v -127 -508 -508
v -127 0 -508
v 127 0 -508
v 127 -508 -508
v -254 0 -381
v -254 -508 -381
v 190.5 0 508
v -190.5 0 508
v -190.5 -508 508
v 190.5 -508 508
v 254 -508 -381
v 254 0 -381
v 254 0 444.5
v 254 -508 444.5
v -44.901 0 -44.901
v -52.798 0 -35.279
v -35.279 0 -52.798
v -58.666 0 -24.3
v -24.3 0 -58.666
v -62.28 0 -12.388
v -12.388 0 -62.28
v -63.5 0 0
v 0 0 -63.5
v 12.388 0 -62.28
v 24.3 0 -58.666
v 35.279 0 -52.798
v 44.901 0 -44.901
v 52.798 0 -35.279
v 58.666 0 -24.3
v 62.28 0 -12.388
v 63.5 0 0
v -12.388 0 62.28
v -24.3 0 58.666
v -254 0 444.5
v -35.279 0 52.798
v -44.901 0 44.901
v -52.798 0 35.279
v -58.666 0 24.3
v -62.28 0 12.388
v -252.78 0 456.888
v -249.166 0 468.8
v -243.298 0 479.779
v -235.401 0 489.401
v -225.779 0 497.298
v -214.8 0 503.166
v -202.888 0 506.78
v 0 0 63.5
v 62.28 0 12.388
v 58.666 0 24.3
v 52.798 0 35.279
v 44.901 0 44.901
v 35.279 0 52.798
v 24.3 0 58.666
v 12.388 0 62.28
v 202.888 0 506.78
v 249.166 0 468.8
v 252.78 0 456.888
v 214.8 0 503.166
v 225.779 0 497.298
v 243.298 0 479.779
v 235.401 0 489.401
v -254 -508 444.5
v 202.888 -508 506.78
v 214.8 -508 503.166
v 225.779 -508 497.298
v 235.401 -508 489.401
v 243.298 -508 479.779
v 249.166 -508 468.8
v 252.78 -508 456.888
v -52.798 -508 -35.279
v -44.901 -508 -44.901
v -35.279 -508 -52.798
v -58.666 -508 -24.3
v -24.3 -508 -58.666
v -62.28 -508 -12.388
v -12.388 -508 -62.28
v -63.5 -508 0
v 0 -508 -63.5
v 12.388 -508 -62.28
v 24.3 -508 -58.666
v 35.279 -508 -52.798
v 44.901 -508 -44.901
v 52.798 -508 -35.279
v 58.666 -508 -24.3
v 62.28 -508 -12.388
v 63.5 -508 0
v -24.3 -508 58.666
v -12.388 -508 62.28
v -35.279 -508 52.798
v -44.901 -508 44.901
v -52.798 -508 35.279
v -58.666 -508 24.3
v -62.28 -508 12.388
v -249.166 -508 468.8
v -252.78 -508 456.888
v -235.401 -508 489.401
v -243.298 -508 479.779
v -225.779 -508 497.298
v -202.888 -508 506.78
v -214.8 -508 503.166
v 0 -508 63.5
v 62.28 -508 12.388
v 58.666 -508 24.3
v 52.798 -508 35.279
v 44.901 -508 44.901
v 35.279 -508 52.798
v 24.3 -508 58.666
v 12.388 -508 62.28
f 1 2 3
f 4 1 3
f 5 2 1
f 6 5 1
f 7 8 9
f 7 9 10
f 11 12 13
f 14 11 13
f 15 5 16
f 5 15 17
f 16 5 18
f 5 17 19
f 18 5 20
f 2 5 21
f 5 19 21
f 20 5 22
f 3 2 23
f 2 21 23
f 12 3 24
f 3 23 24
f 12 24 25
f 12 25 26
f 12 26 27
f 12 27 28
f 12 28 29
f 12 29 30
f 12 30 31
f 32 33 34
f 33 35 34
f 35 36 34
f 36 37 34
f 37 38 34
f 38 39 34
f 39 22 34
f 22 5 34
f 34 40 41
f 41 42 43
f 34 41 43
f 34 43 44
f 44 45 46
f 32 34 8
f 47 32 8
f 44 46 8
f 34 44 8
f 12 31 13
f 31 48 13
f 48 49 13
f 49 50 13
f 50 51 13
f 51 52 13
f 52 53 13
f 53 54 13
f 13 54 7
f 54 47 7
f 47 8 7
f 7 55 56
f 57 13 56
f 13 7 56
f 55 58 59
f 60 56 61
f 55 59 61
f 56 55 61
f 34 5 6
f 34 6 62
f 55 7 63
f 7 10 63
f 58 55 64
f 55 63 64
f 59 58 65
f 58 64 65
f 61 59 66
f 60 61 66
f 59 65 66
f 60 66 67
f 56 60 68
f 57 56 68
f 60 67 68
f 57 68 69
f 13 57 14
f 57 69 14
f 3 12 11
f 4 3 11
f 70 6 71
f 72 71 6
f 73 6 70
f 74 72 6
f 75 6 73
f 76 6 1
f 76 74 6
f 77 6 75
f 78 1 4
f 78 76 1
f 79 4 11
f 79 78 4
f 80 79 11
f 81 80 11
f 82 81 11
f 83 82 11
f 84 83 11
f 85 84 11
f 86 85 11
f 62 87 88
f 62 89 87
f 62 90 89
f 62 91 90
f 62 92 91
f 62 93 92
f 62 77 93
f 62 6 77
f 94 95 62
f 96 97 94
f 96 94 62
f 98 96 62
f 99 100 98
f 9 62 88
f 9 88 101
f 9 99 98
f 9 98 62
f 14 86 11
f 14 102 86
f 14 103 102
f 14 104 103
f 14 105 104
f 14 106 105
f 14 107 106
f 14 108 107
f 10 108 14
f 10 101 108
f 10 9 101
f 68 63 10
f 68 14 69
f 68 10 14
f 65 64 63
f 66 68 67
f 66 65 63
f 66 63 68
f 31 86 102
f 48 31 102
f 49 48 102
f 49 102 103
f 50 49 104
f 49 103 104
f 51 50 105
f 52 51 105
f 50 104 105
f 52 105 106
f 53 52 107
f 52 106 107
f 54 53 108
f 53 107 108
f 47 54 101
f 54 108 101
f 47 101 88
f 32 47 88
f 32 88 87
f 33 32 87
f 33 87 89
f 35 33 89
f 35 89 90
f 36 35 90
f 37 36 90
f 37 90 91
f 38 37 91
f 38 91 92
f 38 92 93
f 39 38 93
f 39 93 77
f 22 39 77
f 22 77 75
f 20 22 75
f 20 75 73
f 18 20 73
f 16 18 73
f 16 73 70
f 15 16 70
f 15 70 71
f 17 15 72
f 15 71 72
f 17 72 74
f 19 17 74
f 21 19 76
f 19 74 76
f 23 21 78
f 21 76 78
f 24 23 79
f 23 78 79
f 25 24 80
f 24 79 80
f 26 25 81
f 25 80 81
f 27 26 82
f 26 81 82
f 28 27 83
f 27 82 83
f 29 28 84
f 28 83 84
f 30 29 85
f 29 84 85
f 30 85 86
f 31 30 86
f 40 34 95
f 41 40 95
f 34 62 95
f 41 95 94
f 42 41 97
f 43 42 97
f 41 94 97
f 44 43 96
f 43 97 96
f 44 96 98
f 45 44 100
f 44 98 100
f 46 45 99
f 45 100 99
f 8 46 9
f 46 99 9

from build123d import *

# Parameters (mm, degrees)
F0_W     = 508
F0_H     = 1016
F1_DEPTH = 508
F2_R     = 63.5
F3_DEPTH = 508.001
F4_R     = 63.5
F5_SIZE  = 127


with BuildPart() as f1:
    # F0 (on Front) → F1 (new body)
    with BuildSketch(Plane.XZ):
        Rectangle(F0_W, F0_H)
    extrude(amount=F1_DEPTH)

    # F2 (on face) → F3 (cut, through all)
    with BuildSketch(Plane.XZ.offset(508)):
        Circle(F2_R)
    extrude(amount=-F3_DEPTH, mode=Mode.SUBTRACT)

    # F4
    f4_edges = [f1.edges().sort_by_distance(p)[0] for p in [
        (254, -254, 508),
        (-254, -254, 508),
    ]]
    fillet(f4_edges, radius=F4_R)

    # F5
    f5_edges = [f1.edges().sort_by_distance(p)[0] for p in [
        (254, -254, -508),
        (-254, -254, -508),
    ]]
    chamfer(f5_edges, length=F5_SIZE)


solid = f1.part
